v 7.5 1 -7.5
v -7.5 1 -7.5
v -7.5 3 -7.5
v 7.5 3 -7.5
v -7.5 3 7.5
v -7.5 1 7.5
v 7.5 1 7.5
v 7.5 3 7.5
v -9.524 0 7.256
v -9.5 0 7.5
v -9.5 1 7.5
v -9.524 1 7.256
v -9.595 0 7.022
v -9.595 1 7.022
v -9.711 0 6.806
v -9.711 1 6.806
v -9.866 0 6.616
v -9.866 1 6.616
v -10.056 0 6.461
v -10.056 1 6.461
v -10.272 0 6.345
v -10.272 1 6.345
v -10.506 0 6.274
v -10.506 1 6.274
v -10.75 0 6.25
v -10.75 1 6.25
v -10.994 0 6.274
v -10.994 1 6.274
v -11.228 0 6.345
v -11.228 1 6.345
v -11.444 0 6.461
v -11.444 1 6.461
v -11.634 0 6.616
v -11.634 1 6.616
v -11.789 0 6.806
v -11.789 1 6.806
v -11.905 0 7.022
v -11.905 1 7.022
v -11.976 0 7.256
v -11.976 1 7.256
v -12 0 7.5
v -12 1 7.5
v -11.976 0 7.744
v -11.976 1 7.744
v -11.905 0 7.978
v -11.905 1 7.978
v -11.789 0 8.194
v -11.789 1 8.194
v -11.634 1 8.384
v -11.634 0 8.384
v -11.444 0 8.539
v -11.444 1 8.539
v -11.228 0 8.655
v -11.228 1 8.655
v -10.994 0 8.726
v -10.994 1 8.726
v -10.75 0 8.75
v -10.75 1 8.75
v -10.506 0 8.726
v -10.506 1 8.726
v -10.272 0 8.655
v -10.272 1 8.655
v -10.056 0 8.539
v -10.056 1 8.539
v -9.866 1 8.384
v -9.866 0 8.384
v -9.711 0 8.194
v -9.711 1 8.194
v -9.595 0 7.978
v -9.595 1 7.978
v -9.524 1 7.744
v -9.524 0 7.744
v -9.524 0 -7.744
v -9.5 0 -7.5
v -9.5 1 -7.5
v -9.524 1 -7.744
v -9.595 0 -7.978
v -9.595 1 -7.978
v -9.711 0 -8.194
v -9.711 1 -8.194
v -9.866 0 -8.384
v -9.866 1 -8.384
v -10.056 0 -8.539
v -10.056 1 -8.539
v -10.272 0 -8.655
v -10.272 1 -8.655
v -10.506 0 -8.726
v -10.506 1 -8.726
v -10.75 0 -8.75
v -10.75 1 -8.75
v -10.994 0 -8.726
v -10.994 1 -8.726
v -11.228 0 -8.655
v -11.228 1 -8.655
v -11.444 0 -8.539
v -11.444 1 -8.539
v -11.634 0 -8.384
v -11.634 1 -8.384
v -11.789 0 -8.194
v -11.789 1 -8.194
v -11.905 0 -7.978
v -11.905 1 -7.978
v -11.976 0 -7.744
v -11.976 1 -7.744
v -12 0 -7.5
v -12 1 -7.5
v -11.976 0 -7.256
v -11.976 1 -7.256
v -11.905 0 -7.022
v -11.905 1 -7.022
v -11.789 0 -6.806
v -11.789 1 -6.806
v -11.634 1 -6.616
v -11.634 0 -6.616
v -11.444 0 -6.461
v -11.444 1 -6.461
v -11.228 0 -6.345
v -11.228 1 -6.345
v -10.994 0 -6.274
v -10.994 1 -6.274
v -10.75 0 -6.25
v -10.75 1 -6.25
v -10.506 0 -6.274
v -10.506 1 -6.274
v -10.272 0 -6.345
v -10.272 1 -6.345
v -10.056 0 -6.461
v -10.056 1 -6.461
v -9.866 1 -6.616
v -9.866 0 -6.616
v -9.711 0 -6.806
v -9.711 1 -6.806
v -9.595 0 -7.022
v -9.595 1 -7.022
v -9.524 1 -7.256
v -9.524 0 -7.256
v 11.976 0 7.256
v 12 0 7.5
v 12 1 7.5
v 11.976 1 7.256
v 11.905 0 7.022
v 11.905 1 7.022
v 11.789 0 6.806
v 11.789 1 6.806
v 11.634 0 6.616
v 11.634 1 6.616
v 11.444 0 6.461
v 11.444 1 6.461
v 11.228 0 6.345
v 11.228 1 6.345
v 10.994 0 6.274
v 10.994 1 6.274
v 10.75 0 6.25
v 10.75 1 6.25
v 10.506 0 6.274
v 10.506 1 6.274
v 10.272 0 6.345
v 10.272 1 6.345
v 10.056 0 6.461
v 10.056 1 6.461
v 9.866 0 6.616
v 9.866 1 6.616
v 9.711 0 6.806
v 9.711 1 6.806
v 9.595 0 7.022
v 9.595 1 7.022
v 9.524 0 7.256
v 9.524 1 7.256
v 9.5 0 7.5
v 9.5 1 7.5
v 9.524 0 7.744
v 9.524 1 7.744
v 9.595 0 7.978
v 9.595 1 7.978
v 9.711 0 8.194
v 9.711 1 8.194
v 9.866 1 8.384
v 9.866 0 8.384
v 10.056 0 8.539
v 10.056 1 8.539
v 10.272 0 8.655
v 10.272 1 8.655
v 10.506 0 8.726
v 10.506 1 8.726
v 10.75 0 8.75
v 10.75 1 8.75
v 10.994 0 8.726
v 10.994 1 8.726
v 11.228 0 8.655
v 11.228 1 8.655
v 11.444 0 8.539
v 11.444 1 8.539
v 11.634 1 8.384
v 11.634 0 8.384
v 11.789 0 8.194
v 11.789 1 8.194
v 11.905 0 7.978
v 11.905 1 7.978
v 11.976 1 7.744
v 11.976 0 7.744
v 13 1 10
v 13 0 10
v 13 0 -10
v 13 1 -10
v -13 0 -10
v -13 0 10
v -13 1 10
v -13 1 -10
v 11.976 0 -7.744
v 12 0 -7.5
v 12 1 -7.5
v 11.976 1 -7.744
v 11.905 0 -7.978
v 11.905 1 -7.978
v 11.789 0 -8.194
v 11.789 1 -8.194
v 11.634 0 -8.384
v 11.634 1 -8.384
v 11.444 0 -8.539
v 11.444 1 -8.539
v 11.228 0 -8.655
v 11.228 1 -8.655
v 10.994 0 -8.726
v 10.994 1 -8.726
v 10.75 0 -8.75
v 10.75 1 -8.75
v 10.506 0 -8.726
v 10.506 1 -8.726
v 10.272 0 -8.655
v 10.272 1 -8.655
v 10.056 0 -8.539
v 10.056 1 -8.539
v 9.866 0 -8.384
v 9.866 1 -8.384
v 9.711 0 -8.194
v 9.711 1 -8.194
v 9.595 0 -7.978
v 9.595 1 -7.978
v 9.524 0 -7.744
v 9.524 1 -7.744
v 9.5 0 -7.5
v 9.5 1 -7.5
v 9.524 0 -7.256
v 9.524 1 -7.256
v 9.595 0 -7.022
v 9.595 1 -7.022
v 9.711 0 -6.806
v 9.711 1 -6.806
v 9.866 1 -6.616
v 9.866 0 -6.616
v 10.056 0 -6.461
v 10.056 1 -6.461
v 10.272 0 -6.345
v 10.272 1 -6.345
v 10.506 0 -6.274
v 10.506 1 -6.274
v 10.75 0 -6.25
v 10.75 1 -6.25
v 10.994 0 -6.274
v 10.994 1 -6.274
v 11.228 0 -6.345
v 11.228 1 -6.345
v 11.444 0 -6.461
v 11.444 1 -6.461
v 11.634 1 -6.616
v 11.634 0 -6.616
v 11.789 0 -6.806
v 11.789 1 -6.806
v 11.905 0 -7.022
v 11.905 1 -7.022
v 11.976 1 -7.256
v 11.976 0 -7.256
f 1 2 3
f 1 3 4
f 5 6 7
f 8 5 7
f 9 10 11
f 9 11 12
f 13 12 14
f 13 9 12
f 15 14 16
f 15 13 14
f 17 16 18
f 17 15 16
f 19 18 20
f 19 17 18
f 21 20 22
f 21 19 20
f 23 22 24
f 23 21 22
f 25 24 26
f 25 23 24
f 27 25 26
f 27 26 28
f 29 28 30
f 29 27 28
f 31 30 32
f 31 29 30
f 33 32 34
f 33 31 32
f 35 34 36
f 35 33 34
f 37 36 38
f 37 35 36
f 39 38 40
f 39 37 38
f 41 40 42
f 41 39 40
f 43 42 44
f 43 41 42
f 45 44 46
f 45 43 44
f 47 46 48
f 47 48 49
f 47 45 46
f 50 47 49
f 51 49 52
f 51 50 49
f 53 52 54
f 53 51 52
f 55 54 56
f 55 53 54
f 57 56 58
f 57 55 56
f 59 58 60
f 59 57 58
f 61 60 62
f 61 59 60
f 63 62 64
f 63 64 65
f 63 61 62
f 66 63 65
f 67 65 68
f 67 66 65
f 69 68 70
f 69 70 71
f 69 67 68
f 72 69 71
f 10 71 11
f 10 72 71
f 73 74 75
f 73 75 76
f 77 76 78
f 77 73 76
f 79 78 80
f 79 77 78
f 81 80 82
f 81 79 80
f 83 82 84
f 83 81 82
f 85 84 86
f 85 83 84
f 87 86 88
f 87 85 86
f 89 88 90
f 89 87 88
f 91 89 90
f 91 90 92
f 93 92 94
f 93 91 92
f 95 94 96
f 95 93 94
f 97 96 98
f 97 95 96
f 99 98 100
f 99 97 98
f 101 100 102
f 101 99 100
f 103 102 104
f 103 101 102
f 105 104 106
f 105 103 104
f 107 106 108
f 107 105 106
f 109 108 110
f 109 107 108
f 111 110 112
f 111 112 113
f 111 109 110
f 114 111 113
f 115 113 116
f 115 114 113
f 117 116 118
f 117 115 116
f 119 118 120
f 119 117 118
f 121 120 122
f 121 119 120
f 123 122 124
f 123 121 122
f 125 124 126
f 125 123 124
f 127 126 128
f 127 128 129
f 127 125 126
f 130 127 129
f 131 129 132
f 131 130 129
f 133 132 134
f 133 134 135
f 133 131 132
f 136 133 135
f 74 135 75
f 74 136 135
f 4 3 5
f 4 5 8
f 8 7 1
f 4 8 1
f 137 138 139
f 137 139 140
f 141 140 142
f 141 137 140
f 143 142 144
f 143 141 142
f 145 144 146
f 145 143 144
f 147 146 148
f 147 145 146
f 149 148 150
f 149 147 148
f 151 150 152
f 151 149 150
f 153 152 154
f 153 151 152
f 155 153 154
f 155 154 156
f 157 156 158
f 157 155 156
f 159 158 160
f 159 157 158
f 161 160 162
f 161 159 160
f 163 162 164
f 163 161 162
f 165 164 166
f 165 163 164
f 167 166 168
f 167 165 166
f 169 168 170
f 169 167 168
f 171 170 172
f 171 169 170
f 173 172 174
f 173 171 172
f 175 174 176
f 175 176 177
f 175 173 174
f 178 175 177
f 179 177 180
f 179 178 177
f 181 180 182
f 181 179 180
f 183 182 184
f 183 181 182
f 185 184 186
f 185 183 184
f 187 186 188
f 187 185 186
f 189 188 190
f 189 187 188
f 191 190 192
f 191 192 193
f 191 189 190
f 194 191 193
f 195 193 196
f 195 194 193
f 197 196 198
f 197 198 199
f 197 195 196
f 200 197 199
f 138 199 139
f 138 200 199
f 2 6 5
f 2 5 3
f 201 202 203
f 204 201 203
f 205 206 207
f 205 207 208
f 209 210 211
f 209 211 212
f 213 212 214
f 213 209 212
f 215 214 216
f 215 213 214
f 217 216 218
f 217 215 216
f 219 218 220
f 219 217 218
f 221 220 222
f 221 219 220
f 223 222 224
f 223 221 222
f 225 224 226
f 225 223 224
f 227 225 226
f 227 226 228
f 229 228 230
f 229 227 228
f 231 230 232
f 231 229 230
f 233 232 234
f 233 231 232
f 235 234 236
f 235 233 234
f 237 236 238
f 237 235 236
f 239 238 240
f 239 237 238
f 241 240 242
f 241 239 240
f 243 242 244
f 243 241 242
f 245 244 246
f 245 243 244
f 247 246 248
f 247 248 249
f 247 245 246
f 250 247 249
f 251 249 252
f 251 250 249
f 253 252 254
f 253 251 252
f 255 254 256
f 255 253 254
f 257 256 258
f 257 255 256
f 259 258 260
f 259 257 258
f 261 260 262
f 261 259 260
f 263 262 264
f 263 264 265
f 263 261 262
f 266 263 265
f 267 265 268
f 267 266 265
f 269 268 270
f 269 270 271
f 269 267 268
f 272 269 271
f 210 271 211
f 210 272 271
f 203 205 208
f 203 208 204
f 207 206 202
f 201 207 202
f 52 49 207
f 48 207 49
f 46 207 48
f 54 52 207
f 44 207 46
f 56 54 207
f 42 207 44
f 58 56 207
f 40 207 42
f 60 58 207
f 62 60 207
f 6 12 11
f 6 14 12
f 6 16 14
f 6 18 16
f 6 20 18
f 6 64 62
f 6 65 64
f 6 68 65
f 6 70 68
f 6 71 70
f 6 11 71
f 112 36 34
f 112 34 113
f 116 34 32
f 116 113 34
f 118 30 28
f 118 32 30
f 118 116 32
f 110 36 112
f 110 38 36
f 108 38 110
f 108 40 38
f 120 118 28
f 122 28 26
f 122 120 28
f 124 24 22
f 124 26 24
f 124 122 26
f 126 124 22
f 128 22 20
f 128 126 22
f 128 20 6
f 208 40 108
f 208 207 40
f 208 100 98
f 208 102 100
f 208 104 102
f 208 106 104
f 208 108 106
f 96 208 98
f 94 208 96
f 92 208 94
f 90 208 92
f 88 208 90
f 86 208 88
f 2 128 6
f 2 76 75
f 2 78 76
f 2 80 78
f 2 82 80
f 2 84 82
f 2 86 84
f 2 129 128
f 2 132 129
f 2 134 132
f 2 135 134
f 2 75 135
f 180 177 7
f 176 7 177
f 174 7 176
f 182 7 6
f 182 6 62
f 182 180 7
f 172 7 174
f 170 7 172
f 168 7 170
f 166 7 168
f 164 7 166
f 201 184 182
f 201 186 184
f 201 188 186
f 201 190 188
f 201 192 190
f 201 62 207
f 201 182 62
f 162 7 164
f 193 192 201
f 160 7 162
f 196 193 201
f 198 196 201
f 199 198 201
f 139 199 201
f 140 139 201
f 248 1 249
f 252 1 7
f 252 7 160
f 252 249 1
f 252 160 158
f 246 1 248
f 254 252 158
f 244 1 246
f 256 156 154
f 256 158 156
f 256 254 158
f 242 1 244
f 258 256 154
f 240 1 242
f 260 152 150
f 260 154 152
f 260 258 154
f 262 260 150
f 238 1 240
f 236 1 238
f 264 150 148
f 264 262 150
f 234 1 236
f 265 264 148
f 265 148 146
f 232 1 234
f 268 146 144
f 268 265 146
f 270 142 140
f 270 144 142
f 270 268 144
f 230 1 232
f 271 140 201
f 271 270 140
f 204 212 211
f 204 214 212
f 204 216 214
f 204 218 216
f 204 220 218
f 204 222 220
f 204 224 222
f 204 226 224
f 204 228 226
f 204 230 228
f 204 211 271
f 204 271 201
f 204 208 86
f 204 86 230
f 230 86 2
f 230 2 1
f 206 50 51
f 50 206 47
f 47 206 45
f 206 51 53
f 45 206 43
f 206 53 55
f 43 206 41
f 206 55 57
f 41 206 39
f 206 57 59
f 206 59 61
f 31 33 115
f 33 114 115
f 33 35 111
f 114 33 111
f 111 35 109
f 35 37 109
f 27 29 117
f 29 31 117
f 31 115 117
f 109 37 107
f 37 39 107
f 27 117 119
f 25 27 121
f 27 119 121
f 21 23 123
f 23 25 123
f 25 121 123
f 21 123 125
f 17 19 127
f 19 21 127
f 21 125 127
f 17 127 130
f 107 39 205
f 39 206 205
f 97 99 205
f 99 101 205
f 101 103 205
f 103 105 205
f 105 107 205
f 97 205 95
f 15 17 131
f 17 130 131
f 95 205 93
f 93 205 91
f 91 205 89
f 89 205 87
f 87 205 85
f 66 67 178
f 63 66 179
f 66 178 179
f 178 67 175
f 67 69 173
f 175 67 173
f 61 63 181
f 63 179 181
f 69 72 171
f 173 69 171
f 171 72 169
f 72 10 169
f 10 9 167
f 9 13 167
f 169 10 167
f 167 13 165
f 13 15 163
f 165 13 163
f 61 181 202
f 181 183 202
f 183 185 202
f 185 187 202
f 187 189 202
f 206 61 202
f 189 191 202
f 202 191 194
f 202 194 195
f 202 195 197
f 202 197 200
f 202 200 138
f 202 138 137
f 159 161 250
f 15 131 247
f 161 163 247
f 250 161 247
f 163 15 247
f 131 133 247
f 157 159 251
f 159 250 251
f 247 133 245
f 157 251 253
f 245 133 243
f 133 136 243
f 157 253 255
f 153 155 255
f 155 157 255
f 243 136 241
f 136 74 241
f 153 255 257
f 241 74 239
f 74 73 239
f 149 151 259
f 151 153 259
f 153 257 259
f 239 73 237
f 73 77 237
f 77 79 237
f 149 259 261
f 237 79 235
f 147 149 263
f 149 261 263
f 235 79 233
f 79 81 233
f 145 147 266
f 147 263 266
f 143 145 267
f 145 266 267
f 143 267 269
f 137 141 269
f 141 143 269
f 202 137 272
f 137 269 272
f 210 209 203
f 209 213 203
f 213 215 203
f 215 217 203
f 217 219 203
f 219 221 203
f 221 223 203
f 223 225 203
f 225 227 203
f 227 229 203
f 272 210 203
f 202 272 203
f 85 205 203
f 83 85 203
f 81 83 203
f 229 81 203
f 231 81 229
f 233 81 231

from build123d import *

# Parameters (mm, degrees)
SKETCH1_W           = 26
SKETCH1_H           = 20
BOSS_EXTRUDE1_DEPTH = 1
SKETCH2_R           = 1.25
CUT_EXTRUDE1_DEPTH  = 1
SKETCH3_W           = 15
SKETCH3_H           = 15
BOSS_EXTRUDE2_DEPTH = 3


with BuildPart() as part:
    # Sketch1 → Boss-Extrude1 (new body)
    with BuildSketch(Plane(origin=(0, 0, 0), x_dir=(1, 0, 0), z_dir=(0, 1, 0))):
        Rectangle(SKETCH1_W, SKETCH1_H)
    extrude(amount=BOSS_EXTRUDE1_DEPTH)

    # Sketch2 → Cut-Extrude1 (cut)
    with BuildSketch(Plane(origin=(0, 0, 0), x_dir=(1, 0, 0), z_dir=(0, 1, 0))):
        with Locations((-10.75, 7.5)):
            Circle(SKETCH2_R)
        with Locations((-10.75, -7.5)):
            Circle(SKETCH2_R)
        with Locations((10.75, -7.5)):
            Circle(SKETCH2_R)
        with Locations((10.75, 7.5)):
            Circle(SKETCH2_R)
    extrude(amount=CUT_EXTRUDE1_DEPTH, mode=Mode.SUBTRACT)

    # Sketch3 → Boss-Extrude2 (add)
    with BuildSketch(Plane(origin=(0, 0, 0), x_dir=(1, 0, 0), z_dir=(0, 1, 0))):
        Rectangle(SKETCH3_W, SKETCH3_H)
    extrude(amount=BOSS_EXTRUDE2_DEPTH)


solid = part.part
